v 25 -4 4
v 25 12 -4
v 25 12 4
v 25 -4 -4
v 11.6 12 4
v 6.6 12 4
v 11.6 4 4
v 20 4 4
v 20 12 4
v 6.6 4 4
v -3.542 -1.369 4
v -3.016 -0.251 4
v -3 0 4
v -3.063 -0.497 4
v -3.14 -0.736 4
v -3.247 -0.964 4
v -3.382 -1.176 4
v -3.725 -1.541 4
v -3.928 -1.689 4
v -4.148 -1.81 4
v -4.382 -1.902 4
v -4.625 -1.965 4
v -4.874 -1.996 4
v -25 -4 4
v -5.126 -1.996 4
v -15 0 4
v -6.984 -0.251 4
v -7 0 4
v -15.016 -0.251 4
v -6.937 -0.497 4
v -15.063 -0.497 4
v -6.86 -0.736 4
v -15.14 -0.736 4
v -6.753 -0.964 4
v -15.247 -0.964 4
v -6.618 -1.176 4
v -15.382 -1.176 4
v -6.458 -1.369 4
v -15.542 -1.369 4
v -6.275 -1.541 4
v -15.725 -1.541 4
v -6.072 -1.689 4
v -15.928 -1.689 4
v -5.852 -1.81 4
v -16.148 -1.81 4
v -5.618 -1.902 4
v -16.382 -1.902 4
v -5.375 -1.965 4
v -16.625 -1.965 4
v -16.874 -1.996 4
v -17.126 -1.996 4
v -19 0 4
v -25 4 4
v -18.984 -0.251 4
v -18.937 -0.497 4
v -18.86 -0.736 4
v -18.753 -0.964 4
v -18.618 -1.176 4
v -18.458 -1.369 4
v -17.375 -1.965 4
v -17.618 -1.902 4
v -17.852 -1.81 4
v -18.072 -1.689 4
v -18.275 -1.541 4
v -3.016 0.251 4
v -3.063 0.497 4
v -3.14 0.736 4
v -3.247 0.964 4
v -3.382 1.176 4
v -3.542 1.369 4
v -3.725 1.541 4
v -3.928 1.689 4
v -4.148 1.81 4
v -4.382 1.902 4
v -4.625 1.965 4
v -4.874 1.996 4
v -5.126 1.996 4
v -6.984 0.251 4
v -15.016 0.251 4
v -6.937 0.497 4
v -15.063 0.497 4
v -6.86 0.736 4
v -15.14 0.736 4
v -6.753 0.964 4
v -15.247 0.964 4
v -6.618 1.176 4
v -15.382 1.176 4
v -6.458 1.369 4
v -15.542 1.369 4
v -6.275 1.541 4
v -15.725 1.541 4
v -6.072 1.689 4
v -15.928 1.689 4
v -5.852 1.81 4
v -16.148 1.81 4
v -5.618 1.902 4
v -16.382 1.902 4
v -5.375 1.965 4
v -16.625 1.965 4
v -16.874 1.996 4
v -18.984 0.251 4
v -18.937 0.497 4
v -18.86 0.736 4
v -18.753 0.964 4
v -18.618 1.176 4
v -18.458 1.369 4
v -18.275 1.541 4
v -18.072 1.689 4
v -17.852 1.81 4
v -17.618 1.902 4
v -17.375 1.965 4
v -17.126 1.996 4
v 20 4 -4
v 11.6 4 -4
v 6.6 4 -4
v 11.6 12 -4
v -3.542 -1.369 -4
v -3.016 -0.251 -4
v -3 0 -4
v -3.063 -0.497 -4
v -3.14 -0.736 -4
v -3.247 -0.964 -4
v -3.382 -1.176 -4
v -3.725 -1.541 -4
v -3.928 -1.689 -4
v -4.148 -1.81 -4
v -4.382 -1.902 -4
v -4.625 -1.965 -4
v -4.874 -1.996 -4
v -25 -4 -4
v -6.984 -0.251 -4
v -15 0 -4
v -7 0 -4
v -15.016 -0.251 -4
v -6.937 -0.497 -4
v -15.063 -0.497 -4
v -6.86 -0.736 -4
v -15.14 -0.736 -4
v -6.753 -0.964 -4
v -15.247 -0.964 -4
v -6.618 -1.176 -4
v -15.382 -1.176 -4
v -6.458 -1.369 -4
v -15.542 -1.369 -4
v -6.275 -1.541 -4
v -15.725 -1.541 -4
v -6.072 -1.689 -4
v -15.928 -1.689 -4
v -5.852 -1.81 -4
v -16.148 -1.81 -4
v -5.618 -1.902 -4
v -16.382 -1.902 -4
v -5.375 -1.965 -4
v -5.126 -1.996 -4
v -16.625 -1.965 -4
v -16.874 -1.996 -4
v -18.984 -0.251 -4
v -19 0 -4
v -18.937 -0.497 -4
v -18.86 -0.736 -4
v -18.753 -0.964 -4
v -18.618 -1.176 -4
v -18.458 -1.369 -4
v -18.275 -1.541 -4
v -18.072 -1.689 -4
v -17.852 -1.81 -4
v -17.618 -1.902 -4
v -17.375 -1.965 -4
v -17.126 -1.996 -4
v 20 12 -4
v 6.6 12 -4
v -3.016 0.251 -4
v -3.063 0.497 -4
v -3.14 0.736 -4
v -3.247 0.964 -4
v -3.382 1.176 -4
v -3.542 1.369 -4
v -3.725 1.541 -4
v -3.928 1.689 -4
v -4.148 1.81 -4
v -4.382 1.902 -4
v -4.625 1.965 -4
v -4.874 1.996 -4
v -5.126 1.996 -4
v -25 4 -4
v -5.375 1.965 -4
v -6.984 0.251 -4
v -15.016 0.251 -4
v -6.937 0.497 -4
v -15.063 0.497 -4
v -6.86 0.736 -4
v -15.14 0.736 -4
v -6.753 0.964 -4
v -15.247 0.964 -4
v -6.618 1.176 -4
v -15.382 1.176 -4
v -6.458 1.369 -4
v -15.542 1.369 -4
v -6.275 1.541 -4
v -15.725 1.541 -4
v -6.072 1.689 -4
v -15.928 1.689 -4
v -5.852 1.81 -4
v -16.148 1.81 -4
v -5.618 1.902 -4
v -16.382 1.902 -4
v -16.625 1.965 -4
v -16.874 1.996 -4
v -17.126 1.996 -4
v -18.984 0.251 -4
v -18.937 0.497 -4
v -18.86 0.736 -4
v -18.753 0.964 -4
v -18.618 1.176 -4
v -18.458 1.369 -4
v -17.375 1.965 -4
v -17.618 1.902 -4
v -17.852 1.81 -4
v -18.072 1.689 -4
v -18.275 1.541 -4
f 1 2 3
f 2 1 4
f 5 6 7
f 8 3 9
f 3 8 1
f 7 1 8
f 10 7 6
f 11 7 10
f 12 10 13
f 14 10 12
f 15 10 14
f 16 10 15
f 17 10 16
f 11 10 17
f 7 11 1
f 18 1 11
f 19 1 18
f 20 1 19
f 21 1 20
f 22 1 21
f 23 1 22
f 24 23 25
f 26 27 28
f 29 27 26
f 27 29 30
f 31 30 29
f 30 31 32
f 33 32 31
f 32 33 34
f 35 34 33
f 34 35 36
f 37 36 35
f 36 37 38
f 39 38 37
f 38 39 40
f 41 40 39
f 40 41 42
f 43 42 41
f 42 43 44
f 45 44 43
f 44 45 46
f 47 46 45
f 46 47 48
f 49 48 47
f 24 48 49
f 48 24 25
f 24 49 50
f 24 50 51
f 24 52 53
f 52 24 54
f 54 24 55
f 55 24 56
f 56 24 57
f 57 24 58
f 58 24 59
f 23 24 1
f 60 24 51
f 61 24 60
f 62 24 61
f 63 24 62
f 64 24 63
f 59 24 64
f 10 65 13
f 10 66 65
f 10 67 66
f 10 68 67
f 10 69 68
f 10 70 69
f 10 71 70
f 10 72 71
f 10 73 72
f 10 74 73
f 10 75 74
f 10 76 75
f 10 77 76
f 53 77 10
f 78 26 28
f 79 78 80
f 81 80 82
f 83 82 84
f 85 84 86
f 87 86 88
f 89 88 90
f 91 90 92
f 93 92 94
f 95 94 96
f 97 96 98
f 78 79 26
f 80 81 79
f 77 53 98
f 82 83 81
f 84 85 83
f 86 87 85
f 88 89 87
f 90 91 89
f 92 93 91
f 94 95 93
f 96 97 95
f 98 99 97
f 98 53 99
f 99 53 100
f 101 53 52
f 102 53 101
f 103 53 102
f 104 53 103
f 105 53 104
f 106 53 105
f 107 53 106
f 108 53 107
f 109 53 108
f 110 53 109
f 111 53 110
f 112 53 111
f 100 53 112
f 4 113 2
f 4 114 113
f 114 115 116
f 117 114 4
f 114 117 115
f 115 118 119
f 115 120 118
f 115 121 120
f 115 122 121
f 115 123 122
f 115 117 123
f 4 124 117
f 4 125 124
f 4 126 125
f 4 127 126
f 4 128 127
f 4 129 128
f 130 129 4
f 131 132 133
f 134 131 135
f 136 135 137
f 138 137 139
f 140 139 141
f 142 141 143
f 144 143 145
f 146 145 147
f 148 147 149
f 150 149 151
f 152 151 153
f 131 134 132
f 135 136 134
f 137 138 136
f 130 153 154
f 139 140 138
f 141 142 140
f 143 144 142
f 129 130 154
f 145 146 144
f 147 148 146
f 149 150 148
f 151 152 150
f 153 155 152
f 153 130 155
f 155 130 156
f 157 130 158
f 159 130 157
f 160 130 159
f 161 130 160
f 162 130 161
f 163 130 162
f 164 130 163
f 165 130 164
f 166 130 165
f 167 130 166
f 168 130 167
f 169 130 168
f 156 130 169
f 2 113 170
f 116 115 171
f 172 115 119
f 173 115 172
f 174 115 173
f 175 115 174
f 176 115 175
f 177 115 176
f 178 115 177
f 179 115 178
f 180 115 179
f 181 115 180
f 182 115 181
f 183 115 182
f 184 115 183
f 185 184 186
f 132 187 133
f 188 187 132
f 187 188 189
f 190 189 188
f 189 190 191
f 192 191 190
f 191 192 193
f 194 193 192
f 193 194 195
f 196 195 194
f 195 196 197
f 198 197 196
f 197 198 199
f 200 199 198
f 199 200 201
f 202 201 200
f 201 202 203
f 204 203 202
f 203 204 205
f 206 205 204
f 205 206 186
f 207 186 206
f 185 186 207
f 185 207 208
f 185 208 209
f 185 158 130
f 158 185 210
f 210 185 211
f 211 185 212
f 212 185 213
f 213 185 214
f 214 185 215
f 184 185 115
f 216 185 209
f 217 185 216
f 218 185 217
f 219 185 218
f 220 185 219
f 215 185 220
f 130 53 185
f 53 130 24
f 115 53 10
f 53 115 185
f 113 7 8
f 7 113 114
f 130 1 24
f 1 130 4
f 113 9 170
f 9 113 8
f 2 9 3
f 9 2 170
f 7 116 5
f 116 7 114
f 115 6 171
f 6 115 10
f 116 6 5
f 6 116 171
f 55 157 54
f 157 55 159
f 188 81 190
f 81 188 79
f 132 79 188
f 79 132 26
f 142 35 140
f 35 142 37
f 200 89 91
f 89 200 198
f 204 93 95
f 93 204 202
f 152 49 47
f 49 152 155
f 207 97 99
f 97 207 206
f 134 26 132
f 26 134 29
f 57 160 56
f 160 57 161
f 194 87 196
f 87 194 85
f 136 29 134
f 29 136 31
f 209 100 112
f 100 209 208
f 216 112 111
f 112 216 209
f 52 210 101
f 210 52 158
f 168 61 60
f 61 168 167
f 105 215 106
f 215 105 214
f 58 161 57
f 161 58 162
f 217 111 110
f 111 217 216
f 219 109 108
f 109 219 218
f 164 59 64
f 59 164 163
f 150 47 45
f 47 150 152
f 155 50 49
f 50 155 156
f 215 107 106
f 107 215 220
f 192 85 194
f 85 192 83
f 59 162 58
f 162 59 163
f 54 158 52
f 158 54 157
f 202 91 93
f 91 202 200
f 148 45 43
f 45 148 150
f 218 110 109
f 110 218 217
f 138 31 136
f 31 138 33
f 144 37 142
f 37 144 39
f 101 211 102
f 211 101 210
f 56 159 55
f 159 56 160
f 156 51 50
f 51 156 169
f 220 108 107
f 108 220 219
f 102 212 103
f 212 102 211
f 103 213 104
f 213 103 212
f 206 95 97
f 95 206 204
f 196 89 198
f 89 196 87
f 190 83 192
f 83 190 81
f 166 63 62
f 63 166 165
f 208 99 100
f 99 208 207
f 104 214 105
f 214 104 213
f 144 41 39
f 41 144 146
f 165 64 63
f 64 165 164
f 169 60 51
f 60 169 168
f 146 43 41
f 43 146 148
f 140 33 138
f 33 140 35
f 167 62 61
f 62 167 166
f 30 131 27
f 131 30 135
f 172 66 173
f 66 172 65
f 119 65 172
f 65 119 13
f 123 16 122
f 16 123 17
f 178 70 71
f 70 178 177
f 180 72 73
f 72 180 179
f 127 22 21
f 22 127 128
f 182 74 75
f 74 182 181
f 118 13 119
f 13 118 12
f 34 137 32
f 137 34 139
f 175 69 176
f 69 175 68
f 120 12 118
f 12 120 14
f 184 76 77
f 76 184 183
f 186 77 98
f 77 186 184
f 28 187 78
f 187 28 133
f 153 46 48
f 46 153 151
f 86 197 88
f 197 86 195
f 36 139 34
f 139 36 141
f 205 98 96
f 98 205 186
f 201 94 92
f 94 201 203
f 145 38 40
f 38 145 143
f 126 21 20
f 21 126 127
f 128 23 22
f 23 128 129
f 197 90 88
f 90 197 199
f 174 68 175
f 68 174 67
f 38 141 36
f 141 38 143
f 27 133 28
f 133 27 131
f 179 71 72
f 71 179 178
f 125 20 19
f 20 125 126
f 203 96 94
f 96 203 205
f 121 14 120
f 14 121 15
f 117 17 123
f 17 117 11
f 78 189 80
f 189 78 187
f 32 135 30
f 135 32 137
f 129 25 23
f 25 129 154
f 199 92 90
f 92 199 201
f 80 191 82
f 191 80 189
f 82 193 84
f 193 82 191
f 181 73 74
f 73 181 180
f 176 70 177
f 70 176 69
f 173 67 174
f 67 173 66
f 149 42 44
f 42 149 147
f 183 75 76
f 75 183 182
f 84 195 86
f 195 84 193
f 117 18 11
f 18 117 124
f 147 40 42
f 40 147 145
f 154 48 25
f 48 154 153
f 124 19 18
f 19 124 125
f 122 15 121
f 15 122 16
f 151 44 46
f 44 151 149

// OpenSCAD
// triple gpu brace
// GTX 1080 TI

backbone_x = 50;
waterblock_x = 8.4;
jaw_x = 5.0;

backbone_y = 8.0;
jaw_y = 8.0;

thickness_z = 8.0;

$fn = 50;

difference () {
    union () {
        cube([backbone_x, backbone_y, thickness_z], center = true);
        
        translate([backbone_x/2 - jaw_x/2, (backbone_y/2 + jaw_y/2), 0])
        cube([jaw_x, jaw_y, thickness_z], center = true);
        
        translate([((backbone_x/2 - jaw_x) - (waterblock_x + jaw_x/2)),
            (backbone_y/2 + jaw_y/2),
            0])
        cube([jaw_x, jaw_y, thickness_z], center = true);
    }
    // subtract
    {
        translate([-(backbone_x/2 - 8), 0, 0])
        #cylinder(r = 2, h = thickness_z, center = true);
        
        translate([-(backbone_x/2 - 20), 0, 0])
        cylinder(r = 2, h = thickness_z, center = true);      
    }
}
